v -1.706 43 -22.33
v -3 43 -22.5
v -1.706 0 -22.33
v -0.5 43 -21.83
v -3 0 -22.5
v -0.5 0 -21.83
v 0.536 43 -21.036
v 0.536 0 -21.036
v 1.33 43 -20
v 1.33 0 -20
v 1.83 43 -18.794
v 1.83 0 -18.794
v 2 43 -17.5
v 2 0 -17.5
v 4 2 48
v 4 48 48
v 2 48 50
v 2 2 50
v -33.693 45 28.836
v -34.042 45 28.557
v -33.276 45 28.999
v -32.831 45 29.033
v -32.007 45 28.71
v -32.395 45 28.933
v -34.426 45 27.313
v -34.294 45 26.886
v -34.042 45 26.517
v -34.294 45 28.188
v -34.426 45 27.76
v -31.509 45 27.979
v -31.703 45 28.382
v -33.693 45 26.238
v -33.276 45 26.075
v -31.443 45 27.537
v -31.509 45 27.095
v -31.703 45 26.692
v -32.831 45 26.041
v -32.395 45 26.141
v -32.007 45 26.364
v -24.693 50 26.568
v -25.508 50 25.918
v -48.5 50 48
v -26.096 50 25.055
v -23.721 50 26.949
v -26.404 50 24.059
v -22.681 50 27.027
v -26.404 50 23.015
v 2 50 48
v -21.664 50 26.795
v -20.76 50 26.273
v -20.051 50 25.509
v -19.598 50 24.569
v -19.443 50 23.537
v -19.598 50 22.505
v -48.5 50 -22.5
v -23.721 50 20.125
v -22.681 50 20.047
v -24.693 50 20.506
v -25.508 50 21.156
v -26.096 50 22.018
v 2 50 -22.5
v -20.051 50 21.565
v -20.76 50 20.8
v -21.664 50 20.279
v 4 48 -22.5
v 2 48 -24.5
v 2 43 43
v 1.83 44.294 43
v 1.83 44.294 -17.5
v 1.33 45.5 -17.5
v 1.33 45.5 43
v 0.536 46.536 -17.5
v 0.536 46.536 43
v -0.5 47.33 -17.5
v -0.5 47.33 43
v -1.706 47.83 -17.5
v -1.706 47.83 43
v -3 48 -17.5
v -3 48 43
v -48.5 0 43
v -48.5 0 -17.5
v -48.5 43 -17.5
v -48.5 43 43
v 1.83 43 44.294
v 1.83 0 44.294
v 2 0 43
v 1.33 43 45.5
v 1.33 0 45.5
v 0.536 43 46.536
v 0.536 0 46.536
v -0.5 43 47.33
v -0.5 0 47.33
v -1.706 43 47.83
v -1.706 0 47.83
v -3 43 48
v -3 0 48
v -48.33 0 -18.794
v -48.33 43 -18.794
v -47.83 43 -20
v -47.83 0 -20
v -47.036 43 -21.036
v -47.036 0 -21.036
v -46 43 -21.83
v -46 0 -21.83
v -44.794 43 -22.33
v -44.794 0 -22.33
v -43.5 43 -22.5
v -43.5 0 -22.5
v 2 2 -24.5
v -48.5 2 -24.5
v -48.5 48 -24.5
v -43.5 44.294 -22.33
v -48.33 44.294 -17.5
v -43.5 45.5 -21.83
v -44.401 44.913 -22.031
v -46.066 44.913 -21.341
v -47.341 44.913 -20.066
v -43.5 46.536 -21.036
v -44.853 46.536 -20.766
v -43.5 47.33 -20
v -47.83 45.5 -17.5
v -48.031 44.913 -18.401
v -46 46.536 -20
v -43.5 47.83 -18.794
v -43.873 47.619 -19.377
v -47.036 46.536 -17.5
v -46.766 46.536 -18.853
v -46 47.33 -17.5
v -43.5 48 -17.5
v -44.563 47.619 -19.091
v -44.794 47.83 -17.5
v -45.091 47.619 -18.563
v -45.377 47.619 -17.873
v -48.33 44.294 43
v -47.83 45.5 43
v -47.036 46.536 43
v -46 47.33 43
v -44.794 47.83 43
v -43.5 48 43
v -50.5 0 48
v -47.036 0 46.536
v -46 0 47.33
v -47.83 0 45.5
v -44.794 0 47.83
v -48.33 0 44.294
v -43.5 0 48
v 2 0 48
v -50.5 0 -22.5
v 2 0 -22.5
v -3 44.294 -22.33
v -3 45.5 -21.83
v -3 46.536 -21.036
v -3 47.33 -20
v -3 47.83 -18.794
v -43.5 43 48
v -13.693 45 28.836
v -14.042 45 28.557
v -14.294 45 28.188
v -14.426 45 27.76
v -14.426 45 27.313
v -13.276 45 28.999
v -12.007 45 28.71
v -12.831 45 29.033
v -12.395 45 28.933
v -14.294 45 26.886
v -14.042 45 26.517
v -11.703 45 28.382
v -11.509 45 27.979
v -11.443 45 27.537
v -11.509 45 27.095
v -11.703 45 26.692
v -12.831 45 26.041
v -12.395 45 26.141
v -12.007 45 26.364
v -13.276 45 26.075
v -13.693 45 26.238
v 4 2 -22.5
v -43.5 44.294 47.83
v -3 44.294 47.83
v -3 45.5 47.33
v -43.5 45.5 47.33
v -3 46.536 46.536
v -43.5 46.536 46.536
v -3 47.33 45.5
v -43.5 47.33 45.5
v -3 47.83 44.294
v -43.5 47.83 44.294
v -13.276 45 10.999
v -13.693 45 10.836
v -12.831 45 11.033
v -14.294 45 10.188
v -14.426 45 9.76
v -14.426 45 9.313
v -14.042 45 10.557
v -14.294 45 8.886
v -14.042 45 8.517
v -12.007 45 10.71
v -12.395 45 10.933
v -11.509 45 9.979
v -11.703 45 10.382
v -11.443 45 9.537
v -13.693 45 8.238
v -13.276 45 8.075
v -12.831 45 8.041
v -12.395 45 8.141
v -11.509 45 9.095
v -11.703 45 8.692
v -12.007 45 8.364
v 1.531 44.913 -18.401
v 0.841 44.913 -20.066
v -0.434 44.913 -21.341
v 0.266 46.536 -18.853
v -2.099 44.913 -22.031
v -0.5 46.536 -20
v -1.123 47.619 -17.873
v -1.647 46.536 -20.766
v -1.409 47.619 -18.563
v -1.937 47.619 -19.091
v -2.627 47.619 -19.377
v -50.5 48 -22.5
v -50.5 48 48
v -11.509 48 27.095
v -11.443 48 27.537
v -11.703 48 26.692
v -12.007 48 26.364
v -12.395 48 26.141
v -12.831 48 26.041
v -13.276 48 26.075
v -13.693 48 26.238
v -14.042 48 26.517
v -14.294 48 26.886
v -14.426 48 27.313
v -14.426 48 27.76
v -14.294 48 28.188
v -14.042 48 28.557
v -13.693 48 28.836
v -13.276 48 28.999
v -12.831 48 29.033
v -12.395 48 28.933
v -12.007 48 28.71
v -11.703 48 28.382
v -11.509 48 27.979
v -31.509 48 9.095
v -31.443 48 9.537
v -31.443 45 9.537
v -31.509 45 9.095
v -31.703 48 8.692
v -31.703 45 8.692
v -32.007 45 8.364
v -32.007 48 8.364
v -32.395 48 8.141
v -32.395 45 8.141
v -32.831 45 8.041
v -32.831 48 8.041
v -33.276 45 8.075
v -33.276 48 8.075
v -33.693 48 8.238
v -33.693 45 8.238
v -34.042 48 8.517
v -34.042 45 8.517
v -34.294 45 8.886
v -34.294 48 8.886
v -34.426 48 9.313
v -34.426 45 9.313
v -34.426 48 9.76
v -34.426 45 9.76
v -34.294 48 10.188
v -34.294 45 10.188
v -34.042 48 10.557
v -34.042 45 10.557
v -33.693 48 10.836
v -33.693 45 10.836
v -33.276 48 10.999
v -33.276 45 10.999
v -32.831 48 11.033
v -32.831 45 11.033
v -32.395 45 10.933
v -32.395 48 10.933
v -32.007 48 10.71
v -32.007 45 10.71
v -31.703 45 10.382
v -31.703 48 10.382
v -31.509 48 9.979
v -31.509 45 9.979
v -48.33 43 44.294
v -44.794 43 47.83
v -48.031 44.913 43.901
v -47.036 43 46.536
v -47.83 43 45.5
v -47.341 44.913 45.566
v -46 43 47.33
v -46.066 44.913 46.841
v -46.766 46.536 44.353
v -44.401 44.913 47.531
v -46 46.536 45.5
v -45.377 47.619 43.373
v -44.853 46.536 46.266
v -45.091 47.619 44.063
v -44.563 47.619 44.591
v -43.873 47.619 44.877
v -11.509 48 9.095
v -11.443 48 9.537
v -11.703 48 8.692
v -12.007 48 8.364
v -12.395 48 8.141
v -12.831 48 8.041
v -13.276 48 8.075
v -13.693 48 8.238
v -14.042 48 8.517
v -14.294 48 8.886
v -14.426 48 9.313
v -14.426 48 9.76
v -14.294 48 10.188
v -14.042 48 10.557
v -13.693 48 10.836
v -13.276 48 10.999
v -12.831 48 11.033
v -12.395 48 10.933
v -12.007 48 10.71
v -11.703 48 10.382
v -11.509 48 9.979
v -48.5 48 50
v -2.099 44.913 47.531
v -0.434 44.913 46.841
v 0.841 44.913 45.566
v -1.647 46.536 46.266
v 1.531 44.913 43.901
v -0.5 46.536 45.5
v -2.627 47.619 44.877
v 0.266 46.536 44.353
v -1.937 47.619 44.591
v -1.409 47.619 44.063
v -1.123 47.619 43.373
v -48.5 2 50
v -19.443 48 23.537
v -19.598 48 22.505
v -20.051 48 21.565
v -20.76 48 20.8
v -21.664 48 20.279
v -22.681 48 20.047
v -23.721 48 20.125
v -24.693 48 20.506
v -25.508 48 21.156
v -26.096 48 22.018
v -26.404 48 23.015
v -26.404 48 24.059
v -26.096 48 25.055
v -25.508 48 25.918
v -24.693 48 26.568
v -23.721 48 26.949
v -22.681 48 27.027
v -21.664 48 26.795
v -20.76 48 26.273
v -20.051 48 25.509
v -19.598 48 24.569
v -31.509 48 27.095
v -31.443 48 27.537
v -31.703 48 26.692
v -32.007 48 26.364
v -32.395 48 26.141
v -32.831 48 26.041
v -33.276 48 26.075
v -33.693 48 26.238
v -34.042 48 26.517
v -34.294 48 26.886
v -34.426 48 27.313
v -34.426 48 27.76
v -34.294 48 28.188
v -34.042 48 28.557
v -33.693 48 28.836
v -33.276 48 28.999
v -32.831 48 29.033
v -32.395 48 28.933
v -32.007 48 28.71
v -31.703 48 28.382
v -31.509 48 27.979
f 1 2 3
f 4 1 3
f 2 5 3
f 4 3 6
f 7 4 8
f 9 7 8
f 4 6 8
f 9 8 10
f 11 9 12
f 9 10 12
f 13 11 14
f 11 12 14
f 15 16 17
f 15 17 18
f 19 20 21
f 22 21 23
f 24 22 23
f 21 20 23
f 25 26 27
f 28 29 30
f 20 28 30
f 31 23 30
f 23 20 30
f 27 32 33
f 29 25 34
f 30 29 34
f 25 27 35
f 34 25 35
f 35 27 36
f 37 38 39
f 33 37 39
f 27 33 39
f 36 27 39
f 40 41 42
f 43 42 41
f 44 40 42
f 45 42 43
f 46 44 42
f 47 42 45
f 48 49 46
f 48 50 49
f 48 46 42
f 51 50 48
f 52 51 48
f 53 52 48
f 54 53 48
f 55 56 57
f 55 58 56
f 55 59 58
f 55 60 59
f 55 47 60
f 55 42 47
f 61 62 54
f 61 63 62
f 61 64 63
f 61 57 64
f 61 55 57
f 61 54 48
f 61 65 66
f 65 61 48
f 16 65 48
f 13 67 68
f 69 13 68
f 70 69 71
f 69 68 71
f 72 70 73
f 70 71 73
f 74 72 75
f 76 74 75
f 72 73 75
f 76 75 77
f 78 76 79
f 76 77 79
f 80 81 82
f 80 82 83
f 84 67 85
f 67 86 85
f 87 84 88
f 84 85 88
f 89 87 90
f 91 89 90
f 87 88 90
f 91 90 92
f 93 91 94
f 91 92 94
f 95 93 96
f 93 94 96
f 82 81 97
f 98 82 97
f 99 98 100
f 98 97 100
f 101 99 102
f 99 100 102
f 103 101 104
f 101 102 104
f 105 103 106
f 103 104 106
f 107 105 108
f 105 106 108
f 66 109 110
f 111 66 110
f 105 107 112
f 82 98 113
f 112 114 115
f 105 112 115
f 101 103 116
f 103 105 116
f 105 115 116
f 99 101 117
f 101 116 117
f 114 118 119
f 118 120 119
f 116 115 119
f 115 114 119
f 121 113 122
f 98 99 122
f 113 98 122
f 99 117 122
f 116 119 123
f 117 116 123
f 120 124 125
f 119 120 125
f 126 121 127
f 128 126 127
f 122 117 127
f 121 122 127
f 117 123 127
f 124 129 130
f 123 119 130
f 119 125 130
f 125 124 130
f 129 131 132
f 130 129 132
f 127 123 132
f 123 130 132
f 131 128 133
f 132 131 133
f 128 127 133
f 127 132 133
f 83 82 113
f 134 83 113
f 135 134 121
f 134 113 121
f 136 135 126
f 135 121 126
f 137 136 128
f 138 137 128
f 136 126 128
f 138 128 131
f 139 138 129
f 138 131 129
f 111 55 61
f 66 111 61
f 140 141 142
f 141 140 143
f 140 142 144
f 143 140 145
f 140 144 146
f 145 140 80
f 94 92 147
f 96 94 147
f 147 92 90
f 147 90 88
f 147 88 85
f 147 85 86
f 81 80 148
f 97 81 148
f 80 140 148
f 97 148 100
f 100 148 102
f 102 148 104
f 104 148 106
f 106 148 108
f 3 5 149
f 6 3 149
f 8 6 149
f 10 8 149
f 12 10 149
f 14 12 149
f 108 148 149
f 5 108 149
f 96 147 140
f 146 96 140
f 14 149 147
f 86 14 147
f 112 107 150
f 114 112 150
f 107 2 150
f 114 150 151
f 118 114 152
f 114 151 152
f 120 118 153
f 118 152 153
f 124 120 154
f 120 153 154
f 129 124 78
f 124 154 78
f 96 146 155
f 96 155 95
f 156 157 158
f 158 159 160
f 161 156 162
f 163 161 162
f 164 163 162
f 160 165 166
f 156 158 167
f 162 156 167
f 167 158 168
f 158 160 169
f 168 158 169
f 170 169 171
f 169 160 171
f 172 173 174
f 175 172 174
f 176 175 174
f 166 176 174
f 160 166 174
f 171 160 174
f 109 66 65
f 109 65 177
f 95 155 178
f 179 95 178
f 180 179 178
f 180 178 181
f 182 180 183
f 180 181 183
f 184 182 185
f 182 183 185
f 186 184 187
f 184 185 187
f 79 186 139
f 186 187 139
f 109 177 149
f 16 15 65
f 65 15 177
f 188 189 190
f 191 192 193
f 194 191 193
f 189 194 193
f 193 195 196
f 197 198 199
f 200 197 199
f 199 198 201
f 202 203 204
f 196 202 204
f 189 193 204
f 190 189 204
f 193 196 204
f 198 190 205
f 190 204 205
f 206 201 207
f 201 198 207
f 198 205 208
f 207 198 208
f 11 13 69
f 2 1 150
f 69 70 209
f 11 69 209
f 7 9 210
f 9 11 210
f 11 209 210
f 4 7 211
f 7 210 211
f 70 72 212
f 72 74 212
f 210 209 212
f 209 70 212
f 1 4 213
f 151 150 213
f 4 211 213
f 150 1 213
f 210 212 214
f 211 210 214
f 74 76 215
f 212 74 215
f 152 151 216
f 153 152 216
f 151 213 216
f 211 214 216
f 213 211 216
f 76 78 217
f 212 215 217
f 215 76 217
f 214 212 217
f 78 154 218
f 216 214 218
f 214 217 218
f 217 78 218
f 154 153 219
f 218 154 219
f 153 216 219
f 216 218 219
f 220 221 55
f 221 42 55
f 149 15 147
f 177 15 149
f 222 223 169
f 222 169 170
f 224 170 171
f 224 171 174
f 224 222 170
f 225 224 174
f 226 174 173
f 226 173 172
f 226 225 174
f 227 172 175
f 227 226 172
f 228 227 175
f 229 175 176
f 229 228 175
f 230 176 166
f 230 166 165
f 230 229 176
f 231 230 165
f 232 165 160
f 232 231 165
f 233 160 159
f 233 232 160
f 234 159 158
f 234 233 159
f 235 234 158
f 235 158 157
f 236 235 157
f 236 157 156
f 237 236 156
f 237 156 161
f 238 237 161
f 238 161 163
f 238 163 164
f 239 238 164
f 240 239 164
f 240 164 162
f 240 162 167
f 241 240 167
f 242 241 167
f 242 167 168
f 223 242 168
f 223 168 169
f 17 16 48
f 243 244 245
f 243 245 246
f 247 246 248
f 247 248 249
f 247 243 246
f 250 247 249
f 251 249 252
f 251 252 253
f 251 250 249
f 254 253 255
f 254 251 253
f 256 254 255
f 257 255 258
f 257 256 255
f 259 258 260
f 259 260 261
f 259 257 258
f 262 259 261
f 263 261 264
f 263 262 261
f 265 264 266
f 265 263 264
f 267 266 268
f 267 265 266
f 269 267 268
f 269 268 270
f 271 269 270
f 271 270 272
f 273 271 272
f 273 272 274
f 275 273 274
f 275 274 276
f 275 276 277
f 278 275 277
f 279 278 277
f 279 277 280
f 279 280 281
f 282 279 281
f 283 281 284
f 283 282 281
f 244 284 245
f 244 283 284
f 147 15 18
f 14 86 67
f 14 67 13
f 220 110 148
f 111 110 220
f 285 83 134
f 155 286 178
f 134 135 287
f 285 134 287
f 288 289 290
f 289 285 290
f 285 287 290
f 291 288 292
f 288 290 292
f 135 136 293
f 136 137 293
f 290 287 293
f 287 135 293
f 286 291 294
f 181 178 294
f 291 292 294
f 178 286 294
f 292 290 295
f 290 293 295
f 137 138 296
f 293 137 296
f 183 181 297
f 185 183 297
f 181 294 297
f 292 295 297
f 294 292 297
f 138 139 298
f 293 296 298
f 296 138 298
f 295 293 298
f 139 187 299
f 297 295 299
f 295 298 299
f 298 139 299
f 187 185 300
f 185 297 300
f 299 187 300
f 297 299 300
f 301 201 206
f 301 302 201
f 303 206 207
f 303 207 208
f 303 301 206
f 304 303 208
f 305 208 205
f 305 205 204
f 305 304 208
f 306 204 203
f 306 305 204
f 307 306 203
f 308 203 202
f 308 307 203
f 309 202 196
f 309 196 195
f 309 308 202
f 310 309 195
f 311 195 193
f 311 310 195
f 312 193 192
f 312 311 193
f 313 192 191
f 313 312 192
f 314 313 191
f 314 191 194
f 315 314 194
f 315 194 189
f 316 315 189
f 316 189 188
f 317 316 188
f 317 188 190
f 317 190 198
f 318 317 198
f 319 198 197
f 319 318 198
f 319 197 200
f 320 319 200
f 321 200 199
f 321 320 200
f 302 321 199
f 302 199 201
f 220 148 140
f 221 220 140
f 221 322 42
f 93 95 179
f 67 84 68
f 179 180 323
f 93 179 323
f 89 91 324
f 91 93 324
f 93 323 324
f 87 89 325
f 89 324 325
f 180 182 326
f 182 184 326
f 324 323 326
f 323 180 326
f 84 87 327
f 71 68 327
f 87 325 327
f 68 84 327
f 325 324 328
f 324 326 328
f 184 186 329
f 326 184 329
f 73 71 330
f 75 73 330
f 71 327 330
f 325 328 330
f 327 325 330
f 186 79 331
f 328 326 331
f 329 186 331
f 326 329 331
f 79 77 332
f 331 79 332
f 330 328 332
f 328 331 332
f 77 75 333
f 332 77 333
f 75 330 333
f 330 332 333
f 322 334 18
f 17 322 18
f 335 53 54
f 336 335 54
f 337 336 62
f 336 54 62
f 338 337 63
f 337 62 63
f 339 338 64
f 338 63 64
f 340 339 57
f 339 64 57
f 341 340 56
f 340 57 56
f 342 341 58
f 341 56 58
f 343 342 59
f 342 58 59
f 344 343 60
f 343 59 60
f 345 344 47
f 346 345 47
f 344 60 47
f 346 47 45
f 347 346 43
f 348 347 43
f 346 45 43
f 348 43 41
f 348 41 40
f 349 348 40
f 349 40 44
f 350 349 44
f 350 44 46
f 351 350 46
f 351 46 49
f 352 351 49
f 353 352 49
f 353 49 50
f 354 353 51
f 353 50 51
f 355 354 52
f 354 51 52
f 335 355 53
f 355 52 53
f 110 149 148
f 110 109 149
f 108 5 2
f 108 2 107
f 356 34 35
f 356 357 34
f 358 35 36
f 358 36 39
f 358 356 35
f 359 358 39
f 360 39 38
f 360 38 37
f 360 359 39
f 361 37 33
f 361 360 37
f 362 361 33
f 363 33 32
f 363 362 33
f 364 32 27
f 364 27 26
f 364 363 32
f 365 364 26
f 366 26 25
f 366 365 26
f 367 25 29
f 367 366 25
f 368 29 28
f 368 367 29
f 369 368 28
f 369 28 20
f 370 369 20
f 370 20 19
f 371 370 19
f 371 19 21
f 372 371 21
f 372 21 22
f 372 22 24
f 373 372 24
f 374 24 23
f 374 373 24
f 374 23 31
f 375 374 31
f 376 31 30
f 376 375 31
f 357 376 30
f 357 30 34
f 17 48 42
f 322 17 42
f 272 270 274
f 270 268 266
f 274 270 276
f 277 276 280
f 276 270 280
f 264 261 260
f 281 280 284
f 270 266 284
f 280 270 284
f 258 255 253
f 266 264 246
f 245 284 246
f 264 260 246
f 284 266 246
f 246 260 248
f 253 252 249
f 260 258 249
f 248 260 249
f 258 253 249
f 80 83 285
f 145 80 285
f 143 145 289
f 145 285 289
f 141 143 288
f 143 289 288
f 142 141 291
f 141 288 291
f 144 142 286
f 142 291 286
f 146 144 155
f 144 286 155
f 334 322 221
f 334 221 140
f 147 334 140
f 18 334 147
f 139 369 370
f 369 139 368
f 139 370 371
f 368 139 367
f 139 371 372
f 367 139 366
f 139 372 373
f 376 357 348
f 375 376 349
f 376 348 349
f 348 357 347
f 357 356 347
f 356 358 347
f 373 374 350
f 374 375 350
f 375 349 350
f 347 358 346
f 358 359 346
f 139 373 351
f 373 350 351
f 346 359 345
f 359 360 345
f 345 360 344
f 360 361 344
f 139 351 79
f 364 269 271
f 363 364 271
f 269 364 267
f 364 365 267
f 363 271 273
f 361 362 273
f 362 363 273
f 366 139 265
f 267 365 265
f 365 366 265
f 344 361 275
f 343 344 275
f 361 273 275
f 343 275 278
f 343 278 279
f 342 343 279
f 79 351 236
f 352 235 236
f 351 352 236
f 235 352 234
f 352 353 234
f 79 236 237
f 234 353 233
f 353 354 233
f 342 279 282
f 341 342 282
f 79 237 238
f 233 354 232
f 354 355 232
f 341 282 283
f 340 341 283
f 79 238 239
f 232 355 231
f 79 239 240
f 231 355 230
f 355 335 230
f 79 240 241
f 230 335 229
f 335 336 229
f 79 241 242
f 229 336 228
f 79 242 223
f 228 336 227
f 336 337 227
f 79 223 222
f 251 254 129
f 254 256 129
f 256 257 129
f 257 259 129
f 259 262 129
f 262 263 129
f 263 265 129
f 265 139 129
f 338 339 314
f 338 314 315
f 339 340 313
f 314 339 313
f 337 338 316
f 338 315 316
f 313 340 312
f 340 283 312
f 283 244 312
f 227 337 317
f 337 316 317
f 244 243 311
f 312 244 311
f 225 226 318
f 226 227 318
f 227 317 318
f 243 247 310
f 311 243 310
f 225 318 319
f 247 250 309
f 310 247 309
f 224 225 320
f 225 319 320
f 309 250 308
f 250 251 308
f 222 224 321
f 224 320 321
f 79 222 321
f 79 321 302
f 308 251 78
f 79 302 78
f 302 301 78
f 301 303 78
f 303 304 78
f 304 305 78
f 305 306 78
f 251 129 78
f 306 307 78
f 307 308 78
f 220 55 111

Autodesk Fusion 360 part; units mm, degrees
sketch "Sketch1" plane through (0, 0, 0) normal (0, 1, 0) x (1, 0, 0)
  line L0 (-50.5, -50) -> (4, -50)
  line L1 (4, -50) -> (4, 24.5)
  line L2 (4, 24.5) -> (-50.5, 24.5)
  line L3 (-50.5, 24.5) -> (-50.5, -50)
  dimension "d1" = 74.5
  dimension "d2" = 54.5
extrude "Extrude1" add sketch "Sketch1" along normal blind 50
shell "Shell1" thickness 2 removed faces 1 at (-14.1667, 0, 0.3333)
fillet "Fillet1" radius 5 1 edges at (-48.5, 24, -22.5)
fillet "Fillet2" radius 5 1 edges at (2, 24, -22.5)
fillet "Fillet3" radius 5 1 edges at (2, 24, 48)
fillet "Fillet4" radius 5 1 edges at (-48.5, 24, 48)
fillet "Fillet5" radius 5 8 edges at (-47.0355, 48, 46.5355) (-23.25, 48, 48) (0.5355, 48, 46.5355) (2, 48, 12.75) (0.5355, 48, -21.0355) (-23.25, 48, -22.5) (-47.0355, 48, -21.0355) (-48.5, 48, 12.75)
chamfer "Chamfer1" distance 2 angle 45 11 edges at (-50.5, 25, 50) (4, 25, 50) (4, 25, -24.5) (4, 50, 12.75) (4, 0, 12.75) (-23.25, 50, 50) (-23.25, 50, -24.5) (-50.5, 50, 12.75) (-50.5, 25, -24.5) (-23.25, 0, -24.5) (-23.25, 0, 50)
ref_plane "WorkPlane1" through (-23.25, 50, 12.75) normal (0, 1, 0) x (0, 0, 1)
sketch "Sketch2" plane through (0, 50, 0) normal (0, 1, 0) x (1, 0, 0)
  circle A0 centre (-22.9426, -23.5369) radius 4
  circle A1 centre (-22.9426, -23.5369) radius 3.5
  circle A2 centre (-32.9426, -9.5369) radius 1.5
  circle A3 centre (-12.9426, -9.5369) radius 1.5
  circle A4 centre (-12.9426, -27.5369) radius 1.5
  circle A5 centre (-32.9426, -27.5369) radius 1.5
extrude "Extrude2" add sketch "Sketch2" against normal blind 5 contours A2 | A3 | A4 | A5
extrude "Extrude3" cut sketch "Sketch2" against normal blind 7 contours A1
